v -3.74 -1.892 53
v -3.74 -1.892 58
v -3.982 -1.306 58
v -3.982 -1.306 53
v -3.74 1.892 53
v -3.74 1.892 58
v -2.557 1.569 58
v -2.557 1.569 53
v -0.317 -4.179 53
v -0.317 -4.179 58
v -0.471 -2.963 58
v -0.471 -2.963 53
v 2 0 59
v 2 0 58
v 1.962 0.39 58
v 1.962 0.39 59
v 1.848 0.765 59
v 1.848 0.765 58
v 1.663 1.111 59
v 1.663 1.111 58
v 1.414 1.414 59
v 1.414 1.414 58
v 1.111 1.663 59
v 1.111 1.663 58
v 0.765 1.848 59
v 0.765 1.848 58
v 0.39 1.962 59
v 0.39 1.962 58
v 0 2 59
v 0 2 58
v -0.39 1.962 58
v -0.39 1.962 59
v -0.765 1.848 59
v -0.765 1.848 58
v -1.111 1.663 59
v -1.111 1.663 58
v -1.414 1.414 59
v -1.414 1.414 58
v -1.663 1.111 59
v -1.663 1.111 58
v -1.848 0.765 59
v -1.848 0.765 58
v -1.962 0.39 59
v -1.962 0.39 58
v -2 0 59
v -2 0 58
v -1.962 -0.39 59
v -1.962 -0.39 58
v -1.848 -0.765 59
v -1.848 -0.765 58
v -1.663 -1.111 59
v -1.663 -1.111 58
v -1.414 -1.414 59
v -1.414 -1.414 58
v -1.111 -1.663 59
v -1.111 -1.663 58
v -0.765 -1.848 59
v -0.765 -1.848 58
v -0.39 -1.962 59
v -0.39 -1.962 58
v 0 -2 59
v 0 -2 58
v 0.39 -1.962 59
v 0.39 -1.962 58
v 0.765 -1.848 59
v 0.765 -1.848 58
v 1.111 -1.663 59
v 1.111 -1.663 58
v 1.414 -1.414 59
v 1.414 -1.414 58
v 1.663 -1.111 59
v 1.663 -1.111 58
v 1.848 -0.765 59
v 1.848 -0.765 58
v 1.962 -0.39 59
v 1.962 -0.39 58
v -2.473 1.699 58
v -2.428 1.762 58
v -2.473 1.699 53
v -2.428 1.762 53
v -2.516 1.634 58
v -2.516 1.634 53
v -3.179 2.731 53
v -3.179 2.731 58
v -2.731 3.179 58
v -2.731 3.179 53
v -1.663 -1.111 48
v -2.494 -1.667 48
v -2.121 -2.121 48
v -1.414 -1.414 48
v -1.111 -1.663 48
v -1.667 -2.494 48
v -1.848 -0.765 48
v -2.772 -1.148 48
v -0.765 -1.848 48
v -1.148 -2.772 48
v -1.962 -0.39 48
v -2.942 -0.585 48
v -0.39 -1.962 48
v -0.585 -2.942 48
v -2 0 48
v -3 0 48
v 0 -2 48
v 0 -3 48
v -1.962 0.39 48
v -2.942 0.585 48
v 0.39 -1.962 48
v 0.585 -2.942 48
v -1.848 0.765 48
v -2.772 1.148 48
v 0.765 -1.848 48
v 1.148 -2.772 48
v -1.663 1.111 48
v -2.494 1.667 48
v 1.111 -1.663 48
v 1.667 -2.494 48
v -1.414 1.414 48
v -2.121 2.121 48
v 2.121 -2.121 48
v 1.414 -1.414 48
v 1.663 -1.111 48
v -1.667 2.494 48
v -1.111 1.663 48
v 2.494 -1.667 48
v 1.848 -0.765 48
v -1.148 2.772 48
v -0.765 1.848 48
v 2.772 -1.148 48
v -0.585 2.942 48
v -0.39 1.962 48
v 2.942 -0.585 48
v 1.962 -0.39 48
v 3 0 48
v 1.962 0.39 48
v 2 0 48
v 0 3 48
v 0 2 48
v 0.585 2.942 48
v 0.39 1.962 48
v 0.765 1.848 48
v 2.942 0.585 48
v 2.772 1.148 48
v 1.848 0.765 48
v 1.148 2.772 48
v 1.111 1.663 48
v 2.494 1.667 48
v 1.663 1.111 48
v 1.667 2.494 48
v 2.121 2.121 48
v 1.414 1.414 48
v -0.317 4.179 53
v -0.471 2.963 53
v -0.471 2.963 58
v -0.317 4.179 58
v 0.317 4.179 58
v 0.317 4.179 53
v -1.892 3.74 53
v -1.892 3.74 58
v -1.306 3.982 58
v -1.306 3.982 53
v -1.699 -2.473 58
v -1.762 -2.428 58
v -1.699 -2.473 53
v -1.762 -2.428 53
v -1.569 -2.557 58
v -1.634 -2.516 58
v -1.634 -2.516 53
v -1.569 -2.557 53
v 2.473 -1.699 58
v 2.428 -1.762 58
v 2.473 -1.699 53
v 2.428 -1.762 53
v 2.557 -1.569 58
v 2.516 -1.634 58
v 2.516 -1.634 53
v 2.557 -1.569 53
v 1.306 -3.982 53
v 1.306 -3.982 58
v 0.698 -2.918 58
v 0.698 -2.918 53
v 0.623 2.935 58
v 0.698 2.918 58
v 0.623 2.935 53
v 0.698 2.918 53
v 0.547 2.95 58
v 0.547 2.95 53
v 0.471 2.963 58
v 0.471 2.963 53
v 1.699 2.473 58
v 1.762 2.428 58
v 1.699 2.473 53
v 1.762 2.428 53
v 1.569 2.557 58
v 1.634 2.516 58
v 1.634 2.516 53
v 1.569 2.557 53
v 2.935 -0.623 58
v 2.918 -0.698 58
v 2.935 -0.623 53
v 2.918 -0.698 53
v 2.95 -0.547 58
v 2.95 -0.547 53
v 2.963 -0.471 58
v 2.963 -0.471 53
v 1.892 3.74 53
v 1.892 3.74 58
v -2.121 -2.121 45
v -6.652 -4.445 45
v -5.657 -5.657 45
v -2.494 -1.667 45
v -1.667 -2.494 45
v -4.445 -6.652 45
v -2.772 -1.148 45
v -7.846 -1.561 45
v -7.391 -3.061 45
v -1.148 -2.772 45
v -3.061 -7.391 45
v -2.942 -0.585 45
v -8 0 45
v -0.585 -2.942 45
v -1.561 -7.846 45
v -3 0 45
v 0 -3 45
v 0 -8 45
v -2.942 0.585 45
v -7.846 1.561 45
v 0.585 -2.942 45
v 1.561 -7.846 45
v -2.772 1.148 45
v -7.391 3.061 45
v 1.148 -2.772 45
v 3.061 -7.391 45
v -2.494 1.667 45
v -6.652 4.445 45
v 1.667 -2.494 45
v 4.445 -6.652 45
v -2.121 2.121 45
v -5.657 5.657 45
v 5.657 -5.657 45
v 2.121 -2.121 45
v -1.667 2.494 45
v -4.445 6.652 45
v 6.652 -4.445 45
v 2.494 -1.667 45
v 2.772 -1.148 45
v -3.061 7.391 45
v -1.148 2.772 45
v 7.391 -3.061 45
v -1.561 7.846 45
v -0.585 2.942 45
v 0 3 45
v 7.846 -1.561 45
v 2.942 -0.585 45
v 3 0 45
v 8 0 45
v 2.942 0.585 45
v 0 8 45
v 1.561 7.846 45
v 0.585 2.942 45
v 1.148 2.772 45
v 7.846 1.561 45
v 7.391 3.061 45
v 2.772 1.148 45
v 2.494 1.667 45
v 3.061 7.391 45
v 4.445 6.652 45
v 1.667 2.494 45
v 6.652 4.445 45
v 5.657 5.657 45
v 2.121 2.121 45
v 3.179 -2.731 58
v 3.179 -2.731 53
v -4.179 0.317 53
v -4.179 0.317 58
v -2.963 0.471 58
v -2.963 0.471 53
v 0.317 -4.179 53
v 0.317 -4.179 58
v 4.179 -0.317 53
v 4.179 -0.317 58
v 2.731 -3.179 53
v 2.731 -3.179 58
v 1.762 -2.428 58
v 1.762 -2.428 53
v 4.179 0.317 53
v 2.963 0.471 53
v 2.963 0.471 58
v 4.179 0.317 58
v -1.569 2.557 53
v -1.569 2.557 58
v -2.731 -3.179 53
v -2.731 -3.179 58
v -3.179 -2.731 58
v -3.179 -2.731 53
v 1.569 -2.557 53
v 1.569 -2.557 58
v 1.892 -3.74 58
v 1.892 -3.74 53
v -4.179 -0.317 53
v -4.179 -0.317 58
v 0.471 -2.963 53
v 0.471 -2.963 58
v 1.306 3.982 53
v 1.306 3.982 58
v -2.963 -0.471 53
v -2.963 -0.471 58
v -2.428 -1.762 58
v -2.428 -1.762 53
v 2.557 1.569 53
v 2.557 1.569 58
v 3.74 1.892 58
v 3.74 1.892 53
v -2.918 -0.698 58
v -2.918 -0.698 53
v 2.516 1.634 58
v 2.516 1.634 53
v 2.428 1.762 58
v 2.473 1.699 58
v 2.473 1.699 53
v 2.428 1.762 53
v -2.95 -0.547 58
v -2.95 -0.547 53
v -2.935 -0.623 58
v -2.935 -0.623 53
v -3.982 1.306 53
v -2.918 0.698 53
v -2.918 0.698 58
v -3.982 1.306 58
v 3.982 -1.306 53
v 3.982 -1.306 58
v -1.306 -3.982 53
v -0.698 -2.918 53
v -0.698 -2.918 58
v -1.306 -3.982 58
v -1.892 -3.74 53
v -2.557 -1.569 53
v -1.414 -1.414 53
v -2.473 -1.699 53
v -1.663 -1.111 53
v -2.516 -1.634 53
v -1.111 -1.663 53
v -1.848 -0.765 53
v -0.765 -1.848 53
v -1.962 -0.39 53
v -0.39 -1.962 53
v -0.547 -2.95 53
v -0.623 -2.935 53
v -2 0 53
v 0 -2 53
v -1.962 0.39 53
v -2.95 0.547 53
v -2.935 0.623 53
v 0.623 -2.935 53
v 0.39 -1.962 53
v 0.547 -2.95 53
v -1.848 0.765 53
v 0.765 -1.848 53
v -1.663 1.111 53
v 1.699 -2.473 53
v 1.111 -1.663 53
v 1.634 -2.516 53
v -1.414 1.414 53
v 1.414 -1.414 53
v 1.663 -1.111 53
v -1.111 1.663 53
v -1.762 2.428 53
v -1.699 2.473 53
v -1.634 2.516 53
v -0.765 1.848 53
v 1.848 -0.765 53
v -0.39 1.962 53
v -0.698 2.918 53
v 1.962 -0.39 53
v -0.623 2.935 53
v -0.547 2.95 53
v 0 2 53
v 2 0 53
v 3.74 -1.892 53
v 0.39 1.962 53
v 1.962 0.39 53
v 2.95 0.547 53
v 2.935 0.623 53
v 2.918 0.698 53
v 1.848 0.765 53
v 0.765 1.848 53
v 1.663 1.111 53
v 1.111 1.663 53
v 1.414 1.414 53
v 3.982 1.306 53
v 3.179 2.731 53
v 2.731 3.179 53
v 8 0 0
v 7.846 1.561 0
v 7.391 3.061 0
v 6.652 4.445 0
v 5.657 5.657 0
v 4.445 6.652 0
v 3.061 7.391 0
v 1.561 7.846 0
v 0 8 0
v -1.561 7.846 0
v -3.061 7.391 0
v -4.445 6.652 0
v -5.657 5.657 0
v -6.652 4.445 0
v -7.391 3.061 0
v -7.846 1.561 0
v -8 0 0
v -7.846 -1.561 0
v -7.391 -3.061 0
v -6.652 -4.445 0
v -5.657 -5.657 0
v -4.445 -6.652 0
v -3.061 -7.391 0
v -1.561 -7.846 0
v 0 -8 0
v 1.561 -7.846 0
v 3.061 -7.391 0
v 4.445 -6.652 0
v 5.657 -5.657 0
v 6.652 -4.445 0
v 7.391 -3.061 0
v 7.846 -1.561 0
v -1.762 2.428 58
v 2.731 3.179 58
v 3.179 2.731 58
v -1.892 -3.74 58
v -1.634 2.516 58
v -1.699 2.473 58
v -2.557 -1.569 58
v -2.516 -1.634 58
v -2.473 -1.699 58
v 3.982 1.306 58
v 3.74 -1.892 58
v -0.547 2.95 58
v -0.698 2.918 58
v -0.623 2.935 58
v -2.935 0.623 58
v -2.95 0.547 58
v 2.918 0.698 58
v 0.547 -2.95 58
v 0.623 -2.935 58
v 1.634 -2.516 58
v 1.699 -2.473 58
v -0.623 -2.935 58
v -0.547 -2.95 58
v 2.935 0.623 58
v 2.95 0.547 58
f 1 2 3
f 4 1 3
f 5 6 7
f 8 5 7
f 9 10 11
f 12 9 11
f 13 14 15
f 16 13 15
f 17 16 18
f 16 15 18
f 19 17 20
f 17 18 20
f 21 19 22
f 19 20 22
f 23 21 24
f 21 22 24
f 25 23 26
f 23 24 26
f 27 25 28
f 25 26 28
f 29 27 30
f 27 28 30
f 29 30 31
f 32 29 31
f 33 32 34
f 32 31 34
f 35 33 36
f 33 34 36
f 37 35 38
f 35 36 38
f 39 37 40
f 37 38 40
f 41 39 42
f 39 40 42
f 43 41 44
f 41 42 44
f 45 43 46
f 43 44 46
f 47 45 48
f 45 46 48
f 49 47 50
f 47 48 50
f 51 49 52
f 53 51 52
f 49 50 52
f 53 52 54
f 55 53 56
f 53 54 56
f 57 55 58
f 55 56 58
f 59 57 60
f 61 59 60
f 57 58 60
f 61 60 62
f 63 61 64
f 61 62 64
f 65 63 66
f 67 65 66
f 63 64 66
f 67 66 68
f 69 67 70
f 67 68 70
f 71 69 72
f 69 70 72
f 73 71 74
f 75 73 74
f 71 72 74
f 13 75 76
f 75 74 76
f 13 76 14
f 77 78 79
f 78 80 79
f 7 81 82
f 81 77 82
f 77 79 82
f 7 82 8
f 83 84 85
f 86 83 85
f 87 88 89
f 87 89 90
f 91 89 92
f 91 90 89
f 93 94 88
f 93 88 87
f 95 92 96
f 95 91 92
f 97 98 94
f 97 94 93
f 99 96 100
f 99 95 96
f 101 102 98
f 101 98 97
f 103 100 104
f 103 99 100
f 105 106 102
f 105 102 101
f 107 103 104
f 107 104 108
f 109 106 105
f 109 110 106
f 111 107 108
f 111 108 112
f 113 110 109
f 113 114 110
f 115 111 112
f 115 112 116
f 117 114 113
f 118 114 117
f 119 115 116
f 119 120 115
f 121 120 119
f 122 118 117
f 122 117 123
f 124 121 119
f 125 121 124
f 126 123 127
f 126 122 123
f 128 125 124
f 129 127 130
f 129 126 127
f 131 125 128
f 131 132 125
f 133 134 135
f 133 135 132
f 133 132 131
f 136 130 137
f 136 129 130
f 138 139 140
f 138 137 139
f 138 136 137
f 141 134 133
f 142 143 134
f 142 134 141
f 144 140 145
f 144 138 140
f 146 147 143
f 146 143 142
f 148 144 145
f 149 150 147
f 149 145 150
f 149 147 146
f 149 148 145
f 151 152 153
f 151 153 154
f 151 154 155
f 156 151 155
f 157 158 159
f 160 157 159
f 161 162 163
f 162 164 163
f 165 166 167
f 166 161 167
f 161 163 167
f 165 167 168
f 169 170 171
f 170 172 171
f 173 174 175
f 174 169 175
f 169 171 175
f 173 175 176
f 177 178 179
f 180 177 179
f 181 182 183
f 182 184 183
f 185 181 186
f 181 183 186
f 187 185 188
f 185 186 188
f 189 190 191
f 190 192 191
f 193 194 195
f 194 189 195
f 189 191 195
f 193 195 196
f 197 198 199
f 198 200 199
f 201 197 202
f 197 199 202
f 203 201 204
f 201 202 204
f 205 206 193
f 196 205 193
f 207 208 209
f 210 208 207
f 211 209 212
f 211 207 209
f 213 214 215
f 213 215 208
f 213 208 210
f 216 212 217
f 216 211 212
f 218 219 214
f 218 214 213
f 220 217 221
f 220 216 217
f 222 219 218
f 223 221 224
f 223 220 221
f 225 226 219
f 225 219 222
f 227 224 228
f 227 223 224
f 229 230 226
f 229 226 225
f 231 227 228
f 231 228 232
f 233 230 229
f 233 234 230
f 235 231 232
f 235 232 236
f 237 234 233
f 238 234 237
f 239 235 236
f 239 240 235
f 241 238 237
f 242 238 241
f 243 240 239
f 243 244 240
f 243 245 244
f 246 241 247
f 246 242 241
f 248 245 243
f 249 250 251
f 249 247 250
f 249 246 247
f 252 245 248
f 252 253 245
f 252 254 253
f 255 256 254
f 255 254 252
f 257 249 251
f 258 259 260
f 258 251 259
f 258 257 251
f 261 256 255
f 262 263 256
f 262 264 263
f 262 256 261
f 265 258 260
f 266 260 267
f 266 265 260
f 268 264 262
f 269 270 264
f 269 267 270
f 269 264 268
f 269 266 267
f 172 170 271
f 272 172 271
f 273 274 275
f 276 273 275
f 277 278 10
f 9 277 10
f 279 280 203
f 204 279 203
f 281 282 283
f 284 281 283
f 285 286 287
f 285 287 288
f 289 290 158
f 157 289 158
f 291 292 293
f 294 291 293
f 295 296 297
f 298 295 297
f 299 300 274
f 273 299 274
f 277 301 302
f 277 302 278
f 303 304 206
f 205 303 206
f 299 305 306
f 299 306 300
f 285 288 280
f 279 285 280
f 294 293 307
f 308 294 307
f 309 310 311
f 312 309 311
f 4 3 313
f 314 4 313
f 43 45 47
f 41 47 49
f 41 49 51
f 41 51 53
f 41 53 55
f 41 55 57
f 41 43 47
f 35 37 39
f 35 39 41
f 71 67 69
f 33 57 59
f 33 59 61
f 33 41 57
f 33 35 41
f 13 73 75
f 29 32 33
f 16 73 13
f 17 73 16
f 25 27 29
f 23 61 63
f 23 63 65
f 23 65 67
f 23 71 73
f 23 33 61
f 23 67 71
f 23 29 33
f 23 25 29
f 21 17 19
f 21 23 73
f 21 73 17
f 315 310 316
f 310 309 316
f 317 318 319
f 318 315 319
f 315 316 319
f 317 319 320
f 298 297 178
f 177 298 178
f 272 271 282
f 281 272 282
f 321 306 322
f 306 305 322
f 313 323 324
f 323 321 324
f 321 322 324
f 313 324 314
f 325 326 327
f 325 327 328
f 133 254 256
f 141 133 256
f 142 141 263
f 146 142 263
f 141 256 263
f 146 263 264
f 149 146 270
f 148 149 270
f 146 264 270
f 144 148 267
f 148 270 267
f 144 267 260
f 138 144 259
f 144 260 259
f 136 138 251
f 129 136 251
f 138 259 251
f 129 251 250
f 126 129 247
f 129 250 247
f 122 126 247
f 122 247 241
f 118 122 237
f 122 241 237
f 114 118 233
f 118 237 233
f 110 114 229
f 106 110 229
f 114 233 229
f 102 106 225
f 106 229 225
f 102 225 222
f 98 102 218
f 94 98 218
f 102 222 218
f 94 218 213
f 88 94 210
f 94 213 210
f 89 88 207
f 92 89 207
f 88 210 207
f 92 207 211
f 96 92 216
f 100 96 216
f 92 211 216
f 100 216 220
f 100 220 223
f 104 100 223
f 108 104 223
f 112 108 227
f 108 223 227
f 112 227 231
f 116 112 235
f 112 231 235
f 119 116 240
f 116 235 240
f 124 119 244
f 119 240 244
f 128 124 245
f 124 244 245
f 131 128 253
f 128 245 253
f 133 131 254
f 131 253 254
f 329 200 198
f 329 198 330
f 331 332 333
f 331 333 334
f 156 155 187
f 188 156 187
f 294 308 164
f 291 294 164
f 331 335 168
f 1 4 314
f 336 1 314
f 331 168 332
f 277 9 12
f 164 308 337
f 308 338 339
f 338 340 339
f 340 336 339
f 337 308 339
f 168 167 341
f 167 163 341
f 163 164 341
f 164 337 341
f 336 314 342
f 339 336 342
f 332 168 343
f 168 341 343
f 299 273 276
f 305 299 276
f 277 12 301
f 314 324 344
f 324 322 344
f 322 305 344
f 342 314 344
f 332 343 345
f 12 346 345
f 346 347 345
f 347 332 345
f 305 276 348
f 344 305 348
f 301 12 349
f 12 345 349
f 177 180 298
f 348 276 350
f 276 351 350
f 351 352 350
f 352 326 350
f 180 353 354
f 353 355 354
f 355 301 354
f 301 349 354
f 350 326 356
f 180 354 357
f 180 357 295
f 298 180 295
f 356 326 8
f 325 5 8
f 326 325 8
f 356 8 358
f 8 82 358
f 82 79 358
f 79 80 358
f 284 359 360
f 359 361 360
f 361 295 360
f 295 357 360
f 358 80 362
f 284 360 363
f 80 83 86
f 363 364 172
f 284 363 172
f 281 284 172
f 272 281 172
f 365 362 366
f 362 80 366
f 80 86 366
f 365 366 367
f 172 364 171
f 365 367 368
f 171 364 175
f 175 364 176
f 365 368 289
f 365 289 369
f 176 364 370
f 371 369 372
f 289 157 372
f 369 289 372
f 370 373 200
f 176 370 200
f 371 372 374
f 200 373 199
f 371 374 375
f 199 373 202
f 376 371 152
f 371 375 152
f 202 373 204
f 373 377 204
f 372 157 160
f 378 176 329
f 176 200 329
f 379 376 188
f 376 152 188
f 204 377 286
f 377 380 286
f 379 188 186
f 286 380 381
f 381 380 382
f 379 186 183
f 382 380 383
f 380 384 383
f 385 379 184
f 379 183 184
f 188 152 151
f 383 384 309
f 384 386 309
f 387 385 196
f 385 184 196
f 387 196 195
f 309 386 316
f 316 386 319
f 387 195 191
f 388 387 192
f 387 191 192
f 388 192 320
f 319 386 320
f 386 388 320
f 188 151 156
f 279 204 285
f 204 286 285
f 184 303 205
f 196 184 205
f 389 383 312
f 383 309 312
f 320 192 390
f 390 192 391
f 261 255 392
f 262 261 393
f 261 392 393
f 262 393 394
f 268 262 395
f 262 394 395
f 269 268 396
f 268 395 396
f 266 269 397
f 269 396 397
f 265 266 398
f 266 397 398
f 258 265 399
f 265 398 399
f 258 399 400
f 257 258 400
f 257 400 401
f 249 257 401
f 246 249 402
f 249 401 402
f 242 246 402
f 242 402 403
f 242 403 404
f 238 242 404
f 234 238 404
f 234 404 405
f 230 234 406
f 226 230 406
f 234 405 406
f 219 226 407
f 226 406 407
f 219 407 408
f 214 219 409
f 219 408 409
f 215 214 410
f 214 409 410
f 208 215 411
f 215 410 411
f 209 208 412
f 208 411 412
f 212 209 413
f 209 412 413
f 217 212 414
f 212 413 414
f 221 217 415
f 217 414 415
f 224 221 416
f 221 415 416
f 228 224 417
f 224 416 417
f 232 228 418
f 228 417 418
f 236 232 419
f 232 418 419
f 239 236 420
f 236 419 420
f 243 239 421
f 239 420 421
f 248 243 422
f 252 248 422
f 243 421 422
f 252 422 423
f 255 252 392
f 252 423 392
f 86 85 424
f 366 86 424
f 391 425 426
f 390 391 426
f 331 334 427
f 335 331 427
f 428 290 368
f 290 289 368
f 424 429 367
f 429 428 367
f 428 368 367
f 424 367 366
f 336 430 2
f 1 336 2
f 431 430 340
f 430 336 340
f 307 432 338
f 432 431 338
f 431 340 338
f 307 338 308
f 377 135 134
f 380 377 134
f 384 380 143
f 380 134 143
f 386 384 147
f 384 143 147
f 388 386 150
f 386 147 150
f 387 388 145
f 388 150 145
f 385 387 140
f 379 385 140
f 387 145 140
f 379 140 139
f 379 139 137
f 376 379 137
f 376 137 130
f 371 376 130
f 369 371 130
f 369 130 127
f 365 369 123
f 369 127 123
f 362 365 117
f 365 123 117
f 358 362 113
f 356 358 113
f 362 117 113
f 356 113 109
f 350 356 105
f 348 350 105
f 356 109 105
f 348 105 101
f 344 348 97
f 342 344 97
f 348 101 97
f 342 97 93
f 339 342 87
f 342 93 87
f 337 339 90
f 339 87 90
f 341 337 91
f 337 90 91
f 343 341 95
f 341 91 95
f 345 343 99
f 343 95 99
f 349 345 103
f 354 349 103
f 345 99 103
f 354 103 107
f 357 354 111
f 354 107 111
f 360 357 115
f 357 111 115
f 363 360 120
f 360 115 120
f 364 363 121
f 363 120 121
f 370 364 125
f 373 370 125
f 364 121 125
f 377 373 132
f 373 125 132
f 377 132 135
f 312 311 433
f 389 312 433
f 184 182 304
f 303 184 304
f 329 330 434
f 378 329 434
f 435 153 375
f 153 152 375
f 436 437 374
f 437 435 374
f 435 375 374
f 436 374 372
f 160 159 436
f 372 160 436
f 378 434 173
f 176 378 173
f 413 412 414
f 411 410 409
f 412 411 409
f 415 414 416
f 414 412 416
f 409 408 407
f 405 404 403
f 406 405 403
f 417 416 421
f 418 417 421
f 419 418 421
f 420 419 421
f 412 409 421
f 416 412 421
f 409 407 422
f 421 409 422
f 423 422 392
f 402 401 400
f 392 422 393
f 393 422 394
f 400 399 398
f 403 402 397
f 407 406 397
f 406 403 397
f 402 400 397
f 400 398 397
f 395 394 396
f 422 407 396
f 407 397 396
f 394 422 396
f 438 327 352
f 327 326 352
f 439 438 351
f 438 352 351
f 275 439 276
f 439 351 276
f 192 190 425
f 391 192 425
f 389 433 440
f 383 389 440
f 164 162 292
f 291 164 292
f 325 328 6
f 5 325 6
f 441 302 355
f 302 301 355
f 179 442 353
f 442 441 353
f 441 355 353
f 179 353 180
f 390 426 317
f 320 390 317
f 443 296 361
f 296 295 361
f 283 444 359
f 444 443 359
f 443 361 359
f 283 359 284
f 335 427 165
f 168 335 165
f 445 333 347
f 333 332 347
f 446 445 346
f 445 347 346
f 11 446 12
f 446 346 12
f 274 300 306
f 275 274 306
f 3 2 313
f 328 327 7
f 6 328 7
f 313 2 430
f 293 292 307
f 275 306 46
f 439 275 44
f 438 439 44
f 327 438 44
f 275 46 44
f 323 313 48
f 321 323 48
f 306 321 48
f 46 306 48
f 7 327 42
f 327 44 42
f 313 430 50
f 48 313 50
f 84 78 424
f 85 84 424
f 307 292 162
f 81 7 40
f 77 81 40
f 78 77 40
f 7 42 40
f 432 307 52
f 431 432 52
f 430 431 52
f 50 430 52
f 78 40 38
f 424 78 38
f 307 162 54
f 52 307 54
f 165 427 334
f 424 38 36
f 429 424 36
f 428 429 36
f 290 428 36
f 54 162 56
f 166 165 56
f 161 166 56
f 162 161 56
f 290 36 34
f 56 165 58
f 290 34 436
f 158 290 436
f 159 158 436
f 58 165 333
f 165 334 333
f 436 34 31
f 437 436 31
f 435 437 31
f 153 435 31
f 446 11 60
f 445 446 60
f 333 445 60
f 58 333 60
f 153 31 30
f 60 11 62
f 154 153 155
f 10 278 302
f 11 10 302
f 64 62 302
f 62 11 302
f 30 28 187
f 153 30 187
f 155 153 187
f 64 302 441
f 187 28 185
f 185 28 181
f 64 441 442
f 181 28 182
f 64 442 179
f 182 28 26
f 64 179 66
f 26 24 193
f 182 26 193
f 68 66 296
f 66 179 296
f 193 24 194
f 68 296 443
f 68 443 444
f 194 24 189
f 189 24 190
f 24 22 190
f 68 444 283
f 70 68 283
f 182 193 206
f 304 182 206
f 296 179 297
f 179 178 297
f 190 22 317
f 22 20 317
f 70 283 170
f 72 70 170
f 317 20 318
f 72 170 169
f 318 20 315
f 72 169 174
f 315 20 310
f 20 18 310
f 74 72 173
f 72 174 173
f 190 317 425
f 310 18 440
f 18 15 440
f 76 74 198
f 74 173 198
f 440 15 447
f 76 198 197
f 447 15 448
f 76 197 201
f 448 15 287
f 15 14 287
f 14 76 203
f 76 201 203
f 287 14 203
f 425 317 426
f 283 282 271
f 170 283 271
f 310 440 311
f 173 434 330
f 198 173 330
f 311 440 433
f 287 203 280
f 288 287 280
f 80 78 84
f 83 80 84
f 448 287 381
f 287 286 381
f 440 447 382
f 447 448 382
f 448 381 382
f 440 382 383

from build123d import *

# Parameters (mm, degrees)
ESBO_O1_R                = 8
RESSALTO_EXTRUS_O1_DEPTH = 45
ESBO_O2_R                = 3
RESSALTO_EXTRUS_O2_DEPTH = 3
ESBO_O3_R                = 2
RESSALTO_EXTRUS_O3_DEPTH = 5
ESBO_O4_R                = 3
RESSALTO_EXTRUS_O4_DEPTH = 5
ESBO_O5_R                = 2
RESSALTO_EXTRUS_O5_DEPTH = 1
RESSALTO_EXTRUS_O6_DEPTH = 5
PADR_OCIRCULAR1_COUNT    = 16


with BuildPart() as part:
    # Esboço1 → Ressalto-extrusão1 (new body)
    with BuildSketch(Plane.XY):
        Circle(ESBO_O1_R)
    extrude(amount=RESSALTO_EXTRUS_O1_DEPTH)

    # Esboço2 → Ressalto-extrusão2 (add)
    with BuildSketch(Plane.XY.offset(45)):
        Circle(ESBO_O2_R)
    extrude(amount=RESSALTO_EXTRUS_O2_DEPTH)

    # Esboço3 → Ressalto-extrusão3 (add)
    with BuildSketch(Plane.XY.offset(48)):
        Circle(ESBO_O3_R)
    extrude(amount=RESSALTO_EXTRUS_O3_DEPTH)

    # Esboço4 → Ressalto-extrusão4 (add)
    with BuildSketch(Plane.XY.offset(53)):
        Circle(ESBO_O4_R)
    extrude(amount=RESSALTO_EXTRUS_O4_DEPTH)

    # Esboço5 → Ressalto-extrusão5 (add)
    with BuildSketch(Plane.XY.offset(58)):
        Circle(ESBO_O5_R)
    extrude(amount=RESSALTO_EXTRUS_O5_DEPTH)

    # Esboço6 → Ressalto-extrusão6 (add)
    with BuildSketch(Plane.XY.offset(58)):
        Polygon((-0.5, 2.735669954), (-0.317294901, 4.179040235), (0.317294901, 4.179040235), (0.5, 2.735669954), align=None)
    ressalto_extrus_o6 = extrude(amount=-RESSALTO_EXTRUS_O6_DEPTH)

    # PadrãoCircular1: Ressalto-extrusão6 ×16 about axis
    padr_ocircular1_axis = Axis((0, 0, 0), (0, 0, 1))
    for i in range(1, PADR_OCIRCULAR1_COUNT):
        add(ressalto_extrus_o6.rotate(padr_ocircular1_axis, i * 360 / PADR_OCIRCULAR1_COUNT))


solid = part.part
